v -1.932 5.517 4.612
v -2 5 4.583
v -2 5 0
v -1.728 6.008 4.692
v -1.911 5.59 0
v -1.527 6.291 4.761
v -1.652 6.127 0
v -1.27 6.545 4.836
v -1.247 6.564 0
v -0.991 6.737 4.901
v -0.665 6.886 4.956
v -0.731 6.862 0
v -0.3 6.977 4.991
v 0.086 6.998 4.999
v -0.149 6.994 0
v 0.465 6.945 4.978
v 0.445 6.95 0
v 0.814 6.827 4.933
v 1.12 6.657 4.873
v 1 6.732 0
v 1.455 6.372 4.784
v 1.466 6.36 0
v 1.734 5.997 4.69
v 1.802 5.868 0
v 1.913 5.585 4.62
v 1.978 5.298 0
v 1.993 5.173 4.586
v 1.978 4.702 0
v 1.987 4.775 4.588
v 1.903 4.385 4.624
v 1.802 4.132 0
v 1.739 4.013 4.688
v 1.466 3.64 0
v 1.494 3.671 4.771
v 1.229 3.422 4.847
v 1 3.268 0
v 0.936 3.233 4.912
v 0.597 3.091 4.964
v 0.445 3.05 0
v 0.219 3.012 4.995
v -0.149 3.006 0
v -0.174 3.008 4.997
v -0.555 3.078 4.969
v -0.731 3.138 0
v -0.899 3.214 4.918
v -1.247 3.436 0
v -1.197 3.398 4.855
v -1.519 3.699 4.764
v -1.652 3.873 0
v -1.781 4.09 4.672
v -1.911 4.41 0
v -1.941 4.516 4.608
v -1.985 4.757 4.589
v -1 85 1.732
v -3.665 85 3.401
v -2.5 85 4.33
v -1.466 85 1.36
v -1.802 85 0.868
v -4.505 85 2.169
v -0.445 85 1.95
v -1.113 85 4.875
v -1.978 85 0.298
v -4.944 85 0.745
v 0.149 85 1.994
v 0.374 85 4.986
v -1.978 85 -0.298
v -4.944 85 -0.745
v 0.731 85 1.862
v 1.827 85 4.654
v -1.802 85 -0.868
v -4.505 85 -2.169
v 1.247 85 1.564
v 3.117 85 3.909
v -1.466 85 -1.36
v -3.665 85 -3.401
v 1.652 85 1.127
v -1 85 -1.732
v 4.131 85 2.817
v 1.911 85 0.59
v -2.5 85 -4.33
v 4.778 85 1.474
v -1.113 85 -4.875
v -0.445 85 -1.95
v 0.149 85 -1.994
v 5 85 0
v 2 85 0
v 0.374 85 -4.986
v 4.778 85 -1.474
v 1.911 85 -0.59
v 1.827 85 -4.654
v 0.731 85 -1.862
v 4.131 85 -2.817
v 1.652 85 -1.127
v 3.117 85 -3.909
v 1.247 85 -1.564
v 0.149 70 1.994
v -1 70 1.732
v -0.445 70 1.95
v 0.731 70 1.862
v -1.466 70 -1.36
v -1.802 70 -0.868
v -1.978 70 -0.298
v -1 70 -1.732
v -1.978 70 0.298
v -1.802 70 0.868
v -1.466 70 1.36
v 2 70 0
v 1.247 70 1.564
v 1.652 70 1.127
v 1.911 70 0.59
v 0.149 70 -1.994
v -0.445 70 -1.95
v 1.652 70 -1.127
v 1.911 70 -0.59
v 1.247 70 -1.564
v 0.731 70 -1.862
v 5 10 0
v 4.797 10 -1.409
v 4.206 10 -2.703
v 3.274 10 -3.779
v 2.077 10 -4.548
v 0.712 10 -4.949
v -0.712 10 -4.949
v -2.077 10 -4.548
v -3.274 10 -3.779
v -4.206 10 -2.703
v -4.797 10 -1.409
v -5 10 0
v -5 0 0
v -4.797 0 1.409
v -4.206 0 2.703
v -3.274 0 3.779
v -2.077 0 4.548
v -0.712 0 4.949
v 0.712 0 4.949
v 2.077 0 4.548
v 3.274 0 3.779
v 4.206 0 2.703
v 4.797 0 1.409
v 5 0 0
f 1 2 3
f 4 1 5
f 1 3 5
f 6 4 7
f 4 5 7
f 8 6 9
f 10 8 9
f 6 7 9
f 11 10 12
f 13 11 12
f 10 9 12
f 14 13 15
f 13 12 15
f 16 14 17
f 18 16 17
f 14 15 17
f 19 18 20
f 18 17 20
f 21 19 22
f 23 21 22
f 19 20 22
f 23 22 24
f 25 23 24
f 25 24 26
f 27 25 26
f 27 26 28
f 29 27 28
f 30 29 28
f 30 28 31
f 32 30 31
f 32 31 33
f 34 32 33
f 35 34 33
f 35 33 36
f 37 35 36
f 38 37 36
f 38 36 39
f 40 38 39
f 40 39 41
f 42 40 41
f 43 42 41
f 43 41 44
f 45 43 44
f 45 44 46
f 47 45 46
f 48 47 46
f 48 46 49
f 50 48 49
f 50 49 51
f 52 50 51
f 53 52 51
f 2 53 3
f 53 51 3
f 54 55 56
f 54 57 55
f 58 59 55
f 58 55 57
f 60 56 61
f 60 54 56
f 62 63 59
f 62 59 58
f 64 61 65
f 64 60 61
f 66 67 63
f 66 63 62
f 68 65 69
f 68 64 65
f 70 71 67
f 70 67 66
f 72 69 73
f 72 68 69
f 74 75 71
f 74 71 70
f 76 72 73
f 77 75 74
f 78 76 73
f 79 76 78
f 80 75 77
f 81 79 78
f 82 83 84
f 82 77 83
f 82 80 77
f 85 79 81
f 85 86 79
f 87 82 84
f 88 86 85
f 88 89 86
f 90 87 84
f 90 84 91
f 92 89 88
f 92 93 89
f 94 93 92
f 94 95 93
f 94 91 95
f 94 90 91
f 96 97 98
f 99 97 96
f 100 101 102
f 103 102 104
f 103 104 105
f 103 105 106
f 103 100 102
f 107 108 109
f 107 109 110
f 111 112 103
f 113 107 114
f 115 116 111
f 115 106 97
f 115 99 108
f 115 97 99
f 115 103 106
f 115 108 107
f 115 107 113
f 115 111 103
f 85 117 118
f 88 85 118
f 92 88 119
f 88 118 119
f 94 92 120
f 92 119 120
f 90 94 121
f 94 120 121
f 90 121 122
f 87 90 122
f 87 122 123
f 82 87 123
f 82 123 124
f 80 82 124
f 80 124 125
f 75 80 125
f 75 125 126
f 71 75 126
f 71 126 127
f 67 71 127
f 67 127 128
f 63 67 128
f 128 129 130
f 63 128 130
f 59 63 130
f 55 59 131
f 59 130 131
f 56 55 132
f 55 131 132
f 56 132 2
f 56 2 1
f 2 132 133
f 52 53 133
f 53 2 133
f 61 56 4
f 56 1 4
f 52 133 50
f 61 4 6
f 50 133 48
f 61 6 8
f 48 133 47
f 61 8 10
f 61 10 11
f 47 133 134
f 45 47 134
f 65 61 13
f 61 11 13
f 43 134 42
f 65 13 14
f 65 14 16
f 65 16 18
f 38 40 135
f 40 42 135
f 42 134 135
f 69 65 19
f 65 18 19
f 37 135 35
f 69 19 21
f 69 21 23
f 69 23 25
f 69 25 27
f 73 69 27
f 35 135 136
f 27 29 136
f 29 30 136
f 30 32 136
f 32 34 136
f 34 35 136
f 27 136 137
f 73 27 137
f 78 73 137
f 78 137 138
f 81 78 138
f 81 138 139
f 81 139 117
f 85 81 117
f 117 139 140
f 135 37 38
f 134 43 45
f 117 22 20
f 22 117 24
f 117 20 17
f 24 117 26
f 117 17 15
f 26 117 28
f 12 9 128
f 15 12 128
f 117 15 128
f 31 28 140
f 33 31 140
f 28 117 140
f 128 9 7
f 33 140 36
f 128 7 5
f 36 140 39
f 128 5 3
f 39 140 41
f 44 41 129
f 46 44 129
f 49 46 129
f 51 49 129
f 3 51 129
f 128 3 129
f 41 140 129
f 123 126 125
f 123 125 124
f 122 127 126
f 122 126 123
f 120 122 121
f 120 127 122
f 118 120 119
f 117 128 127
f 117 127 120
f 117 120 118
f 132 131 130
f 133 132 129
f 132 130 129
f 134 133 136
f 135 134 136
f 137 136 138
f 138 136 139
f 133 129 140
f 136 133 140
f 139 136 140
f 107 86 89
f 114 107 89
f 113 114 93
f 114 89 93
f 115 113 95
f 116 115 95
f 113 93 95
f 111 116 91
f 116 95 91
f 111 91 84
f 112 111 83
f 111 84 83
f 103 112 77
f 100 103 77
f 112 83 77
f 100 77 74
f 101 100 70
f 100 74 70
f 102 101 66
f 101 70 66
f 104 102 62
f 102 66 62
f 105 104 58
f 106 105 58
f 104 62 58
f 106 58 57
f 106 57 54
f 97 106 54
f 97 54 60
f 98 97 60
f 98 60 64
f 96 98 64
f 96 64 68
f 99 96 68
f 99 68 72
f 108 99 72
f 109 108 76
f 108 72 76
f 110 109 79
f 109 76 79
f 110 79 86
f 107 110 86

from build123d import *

# Parameters (mm, degrees)
SKETCH1_R           = 5
BOSS_EXTRUDE1_DEPTH = 85
SKETCH2_R           = 2
CUT_EXTRUDE1_DEPTH  = 15
CUT_EXTRUDE5_DEPTH  = 10
SKETCH6_R           = 2
CUT_EXTRUDE6_DEPTH  = 6


with BuildPart() as part:
    # Sketch1 → Boss-Extrude1 (new body)
    with BuildSketch(Plane(origin=(0, 0, 0), x_dir=(1, 0, 0), z_dir=(0, 1, 0))):
        Circle(SKETCH1_R)
    extrude(amount=BOSS_EXTRUDE1_DEPTH)

    # Sketch2 → Cut-Extrude1 (cut)
    with BuildSketch(Plane(origin=(0, 85, 0), x_dir=(1, 0, 0), z_dir=(0, 1, 0))):
        Circle(SKETCH2_R)
    extrude(amount=-CUT_EXTRUDE1_DEPTH, mode=Mode.SUBTRACT)

    # Sketch3 → Cut-Extrude5 (cut)
    with BuildSketch(Plane.XZ):
        with BuildLine():
            Line((5, 0), (-5, 0))
            ThreePointArc((-5, 0), (0, -5), (5, 0))
        make_face()
    extrude(amount=-CUT_EXTRUDE5_DEPTH, mode=Mode.SUBTRACT)

    # Sketch6 → Cut-Extrude6 (cut, through all)
    with BuildSketch(Plane(origin=(0, 0, 0), x_dir=(-1, 0, 0), z_dir=(0, 0, -1))):
        with Locations((0, 5)):
            Circle(SKETCH6_R)
    extrude(amount=-CUT_EXTRUDE6_DEPTH, mode=Mode.SUBTRACT)


solid = part.part
